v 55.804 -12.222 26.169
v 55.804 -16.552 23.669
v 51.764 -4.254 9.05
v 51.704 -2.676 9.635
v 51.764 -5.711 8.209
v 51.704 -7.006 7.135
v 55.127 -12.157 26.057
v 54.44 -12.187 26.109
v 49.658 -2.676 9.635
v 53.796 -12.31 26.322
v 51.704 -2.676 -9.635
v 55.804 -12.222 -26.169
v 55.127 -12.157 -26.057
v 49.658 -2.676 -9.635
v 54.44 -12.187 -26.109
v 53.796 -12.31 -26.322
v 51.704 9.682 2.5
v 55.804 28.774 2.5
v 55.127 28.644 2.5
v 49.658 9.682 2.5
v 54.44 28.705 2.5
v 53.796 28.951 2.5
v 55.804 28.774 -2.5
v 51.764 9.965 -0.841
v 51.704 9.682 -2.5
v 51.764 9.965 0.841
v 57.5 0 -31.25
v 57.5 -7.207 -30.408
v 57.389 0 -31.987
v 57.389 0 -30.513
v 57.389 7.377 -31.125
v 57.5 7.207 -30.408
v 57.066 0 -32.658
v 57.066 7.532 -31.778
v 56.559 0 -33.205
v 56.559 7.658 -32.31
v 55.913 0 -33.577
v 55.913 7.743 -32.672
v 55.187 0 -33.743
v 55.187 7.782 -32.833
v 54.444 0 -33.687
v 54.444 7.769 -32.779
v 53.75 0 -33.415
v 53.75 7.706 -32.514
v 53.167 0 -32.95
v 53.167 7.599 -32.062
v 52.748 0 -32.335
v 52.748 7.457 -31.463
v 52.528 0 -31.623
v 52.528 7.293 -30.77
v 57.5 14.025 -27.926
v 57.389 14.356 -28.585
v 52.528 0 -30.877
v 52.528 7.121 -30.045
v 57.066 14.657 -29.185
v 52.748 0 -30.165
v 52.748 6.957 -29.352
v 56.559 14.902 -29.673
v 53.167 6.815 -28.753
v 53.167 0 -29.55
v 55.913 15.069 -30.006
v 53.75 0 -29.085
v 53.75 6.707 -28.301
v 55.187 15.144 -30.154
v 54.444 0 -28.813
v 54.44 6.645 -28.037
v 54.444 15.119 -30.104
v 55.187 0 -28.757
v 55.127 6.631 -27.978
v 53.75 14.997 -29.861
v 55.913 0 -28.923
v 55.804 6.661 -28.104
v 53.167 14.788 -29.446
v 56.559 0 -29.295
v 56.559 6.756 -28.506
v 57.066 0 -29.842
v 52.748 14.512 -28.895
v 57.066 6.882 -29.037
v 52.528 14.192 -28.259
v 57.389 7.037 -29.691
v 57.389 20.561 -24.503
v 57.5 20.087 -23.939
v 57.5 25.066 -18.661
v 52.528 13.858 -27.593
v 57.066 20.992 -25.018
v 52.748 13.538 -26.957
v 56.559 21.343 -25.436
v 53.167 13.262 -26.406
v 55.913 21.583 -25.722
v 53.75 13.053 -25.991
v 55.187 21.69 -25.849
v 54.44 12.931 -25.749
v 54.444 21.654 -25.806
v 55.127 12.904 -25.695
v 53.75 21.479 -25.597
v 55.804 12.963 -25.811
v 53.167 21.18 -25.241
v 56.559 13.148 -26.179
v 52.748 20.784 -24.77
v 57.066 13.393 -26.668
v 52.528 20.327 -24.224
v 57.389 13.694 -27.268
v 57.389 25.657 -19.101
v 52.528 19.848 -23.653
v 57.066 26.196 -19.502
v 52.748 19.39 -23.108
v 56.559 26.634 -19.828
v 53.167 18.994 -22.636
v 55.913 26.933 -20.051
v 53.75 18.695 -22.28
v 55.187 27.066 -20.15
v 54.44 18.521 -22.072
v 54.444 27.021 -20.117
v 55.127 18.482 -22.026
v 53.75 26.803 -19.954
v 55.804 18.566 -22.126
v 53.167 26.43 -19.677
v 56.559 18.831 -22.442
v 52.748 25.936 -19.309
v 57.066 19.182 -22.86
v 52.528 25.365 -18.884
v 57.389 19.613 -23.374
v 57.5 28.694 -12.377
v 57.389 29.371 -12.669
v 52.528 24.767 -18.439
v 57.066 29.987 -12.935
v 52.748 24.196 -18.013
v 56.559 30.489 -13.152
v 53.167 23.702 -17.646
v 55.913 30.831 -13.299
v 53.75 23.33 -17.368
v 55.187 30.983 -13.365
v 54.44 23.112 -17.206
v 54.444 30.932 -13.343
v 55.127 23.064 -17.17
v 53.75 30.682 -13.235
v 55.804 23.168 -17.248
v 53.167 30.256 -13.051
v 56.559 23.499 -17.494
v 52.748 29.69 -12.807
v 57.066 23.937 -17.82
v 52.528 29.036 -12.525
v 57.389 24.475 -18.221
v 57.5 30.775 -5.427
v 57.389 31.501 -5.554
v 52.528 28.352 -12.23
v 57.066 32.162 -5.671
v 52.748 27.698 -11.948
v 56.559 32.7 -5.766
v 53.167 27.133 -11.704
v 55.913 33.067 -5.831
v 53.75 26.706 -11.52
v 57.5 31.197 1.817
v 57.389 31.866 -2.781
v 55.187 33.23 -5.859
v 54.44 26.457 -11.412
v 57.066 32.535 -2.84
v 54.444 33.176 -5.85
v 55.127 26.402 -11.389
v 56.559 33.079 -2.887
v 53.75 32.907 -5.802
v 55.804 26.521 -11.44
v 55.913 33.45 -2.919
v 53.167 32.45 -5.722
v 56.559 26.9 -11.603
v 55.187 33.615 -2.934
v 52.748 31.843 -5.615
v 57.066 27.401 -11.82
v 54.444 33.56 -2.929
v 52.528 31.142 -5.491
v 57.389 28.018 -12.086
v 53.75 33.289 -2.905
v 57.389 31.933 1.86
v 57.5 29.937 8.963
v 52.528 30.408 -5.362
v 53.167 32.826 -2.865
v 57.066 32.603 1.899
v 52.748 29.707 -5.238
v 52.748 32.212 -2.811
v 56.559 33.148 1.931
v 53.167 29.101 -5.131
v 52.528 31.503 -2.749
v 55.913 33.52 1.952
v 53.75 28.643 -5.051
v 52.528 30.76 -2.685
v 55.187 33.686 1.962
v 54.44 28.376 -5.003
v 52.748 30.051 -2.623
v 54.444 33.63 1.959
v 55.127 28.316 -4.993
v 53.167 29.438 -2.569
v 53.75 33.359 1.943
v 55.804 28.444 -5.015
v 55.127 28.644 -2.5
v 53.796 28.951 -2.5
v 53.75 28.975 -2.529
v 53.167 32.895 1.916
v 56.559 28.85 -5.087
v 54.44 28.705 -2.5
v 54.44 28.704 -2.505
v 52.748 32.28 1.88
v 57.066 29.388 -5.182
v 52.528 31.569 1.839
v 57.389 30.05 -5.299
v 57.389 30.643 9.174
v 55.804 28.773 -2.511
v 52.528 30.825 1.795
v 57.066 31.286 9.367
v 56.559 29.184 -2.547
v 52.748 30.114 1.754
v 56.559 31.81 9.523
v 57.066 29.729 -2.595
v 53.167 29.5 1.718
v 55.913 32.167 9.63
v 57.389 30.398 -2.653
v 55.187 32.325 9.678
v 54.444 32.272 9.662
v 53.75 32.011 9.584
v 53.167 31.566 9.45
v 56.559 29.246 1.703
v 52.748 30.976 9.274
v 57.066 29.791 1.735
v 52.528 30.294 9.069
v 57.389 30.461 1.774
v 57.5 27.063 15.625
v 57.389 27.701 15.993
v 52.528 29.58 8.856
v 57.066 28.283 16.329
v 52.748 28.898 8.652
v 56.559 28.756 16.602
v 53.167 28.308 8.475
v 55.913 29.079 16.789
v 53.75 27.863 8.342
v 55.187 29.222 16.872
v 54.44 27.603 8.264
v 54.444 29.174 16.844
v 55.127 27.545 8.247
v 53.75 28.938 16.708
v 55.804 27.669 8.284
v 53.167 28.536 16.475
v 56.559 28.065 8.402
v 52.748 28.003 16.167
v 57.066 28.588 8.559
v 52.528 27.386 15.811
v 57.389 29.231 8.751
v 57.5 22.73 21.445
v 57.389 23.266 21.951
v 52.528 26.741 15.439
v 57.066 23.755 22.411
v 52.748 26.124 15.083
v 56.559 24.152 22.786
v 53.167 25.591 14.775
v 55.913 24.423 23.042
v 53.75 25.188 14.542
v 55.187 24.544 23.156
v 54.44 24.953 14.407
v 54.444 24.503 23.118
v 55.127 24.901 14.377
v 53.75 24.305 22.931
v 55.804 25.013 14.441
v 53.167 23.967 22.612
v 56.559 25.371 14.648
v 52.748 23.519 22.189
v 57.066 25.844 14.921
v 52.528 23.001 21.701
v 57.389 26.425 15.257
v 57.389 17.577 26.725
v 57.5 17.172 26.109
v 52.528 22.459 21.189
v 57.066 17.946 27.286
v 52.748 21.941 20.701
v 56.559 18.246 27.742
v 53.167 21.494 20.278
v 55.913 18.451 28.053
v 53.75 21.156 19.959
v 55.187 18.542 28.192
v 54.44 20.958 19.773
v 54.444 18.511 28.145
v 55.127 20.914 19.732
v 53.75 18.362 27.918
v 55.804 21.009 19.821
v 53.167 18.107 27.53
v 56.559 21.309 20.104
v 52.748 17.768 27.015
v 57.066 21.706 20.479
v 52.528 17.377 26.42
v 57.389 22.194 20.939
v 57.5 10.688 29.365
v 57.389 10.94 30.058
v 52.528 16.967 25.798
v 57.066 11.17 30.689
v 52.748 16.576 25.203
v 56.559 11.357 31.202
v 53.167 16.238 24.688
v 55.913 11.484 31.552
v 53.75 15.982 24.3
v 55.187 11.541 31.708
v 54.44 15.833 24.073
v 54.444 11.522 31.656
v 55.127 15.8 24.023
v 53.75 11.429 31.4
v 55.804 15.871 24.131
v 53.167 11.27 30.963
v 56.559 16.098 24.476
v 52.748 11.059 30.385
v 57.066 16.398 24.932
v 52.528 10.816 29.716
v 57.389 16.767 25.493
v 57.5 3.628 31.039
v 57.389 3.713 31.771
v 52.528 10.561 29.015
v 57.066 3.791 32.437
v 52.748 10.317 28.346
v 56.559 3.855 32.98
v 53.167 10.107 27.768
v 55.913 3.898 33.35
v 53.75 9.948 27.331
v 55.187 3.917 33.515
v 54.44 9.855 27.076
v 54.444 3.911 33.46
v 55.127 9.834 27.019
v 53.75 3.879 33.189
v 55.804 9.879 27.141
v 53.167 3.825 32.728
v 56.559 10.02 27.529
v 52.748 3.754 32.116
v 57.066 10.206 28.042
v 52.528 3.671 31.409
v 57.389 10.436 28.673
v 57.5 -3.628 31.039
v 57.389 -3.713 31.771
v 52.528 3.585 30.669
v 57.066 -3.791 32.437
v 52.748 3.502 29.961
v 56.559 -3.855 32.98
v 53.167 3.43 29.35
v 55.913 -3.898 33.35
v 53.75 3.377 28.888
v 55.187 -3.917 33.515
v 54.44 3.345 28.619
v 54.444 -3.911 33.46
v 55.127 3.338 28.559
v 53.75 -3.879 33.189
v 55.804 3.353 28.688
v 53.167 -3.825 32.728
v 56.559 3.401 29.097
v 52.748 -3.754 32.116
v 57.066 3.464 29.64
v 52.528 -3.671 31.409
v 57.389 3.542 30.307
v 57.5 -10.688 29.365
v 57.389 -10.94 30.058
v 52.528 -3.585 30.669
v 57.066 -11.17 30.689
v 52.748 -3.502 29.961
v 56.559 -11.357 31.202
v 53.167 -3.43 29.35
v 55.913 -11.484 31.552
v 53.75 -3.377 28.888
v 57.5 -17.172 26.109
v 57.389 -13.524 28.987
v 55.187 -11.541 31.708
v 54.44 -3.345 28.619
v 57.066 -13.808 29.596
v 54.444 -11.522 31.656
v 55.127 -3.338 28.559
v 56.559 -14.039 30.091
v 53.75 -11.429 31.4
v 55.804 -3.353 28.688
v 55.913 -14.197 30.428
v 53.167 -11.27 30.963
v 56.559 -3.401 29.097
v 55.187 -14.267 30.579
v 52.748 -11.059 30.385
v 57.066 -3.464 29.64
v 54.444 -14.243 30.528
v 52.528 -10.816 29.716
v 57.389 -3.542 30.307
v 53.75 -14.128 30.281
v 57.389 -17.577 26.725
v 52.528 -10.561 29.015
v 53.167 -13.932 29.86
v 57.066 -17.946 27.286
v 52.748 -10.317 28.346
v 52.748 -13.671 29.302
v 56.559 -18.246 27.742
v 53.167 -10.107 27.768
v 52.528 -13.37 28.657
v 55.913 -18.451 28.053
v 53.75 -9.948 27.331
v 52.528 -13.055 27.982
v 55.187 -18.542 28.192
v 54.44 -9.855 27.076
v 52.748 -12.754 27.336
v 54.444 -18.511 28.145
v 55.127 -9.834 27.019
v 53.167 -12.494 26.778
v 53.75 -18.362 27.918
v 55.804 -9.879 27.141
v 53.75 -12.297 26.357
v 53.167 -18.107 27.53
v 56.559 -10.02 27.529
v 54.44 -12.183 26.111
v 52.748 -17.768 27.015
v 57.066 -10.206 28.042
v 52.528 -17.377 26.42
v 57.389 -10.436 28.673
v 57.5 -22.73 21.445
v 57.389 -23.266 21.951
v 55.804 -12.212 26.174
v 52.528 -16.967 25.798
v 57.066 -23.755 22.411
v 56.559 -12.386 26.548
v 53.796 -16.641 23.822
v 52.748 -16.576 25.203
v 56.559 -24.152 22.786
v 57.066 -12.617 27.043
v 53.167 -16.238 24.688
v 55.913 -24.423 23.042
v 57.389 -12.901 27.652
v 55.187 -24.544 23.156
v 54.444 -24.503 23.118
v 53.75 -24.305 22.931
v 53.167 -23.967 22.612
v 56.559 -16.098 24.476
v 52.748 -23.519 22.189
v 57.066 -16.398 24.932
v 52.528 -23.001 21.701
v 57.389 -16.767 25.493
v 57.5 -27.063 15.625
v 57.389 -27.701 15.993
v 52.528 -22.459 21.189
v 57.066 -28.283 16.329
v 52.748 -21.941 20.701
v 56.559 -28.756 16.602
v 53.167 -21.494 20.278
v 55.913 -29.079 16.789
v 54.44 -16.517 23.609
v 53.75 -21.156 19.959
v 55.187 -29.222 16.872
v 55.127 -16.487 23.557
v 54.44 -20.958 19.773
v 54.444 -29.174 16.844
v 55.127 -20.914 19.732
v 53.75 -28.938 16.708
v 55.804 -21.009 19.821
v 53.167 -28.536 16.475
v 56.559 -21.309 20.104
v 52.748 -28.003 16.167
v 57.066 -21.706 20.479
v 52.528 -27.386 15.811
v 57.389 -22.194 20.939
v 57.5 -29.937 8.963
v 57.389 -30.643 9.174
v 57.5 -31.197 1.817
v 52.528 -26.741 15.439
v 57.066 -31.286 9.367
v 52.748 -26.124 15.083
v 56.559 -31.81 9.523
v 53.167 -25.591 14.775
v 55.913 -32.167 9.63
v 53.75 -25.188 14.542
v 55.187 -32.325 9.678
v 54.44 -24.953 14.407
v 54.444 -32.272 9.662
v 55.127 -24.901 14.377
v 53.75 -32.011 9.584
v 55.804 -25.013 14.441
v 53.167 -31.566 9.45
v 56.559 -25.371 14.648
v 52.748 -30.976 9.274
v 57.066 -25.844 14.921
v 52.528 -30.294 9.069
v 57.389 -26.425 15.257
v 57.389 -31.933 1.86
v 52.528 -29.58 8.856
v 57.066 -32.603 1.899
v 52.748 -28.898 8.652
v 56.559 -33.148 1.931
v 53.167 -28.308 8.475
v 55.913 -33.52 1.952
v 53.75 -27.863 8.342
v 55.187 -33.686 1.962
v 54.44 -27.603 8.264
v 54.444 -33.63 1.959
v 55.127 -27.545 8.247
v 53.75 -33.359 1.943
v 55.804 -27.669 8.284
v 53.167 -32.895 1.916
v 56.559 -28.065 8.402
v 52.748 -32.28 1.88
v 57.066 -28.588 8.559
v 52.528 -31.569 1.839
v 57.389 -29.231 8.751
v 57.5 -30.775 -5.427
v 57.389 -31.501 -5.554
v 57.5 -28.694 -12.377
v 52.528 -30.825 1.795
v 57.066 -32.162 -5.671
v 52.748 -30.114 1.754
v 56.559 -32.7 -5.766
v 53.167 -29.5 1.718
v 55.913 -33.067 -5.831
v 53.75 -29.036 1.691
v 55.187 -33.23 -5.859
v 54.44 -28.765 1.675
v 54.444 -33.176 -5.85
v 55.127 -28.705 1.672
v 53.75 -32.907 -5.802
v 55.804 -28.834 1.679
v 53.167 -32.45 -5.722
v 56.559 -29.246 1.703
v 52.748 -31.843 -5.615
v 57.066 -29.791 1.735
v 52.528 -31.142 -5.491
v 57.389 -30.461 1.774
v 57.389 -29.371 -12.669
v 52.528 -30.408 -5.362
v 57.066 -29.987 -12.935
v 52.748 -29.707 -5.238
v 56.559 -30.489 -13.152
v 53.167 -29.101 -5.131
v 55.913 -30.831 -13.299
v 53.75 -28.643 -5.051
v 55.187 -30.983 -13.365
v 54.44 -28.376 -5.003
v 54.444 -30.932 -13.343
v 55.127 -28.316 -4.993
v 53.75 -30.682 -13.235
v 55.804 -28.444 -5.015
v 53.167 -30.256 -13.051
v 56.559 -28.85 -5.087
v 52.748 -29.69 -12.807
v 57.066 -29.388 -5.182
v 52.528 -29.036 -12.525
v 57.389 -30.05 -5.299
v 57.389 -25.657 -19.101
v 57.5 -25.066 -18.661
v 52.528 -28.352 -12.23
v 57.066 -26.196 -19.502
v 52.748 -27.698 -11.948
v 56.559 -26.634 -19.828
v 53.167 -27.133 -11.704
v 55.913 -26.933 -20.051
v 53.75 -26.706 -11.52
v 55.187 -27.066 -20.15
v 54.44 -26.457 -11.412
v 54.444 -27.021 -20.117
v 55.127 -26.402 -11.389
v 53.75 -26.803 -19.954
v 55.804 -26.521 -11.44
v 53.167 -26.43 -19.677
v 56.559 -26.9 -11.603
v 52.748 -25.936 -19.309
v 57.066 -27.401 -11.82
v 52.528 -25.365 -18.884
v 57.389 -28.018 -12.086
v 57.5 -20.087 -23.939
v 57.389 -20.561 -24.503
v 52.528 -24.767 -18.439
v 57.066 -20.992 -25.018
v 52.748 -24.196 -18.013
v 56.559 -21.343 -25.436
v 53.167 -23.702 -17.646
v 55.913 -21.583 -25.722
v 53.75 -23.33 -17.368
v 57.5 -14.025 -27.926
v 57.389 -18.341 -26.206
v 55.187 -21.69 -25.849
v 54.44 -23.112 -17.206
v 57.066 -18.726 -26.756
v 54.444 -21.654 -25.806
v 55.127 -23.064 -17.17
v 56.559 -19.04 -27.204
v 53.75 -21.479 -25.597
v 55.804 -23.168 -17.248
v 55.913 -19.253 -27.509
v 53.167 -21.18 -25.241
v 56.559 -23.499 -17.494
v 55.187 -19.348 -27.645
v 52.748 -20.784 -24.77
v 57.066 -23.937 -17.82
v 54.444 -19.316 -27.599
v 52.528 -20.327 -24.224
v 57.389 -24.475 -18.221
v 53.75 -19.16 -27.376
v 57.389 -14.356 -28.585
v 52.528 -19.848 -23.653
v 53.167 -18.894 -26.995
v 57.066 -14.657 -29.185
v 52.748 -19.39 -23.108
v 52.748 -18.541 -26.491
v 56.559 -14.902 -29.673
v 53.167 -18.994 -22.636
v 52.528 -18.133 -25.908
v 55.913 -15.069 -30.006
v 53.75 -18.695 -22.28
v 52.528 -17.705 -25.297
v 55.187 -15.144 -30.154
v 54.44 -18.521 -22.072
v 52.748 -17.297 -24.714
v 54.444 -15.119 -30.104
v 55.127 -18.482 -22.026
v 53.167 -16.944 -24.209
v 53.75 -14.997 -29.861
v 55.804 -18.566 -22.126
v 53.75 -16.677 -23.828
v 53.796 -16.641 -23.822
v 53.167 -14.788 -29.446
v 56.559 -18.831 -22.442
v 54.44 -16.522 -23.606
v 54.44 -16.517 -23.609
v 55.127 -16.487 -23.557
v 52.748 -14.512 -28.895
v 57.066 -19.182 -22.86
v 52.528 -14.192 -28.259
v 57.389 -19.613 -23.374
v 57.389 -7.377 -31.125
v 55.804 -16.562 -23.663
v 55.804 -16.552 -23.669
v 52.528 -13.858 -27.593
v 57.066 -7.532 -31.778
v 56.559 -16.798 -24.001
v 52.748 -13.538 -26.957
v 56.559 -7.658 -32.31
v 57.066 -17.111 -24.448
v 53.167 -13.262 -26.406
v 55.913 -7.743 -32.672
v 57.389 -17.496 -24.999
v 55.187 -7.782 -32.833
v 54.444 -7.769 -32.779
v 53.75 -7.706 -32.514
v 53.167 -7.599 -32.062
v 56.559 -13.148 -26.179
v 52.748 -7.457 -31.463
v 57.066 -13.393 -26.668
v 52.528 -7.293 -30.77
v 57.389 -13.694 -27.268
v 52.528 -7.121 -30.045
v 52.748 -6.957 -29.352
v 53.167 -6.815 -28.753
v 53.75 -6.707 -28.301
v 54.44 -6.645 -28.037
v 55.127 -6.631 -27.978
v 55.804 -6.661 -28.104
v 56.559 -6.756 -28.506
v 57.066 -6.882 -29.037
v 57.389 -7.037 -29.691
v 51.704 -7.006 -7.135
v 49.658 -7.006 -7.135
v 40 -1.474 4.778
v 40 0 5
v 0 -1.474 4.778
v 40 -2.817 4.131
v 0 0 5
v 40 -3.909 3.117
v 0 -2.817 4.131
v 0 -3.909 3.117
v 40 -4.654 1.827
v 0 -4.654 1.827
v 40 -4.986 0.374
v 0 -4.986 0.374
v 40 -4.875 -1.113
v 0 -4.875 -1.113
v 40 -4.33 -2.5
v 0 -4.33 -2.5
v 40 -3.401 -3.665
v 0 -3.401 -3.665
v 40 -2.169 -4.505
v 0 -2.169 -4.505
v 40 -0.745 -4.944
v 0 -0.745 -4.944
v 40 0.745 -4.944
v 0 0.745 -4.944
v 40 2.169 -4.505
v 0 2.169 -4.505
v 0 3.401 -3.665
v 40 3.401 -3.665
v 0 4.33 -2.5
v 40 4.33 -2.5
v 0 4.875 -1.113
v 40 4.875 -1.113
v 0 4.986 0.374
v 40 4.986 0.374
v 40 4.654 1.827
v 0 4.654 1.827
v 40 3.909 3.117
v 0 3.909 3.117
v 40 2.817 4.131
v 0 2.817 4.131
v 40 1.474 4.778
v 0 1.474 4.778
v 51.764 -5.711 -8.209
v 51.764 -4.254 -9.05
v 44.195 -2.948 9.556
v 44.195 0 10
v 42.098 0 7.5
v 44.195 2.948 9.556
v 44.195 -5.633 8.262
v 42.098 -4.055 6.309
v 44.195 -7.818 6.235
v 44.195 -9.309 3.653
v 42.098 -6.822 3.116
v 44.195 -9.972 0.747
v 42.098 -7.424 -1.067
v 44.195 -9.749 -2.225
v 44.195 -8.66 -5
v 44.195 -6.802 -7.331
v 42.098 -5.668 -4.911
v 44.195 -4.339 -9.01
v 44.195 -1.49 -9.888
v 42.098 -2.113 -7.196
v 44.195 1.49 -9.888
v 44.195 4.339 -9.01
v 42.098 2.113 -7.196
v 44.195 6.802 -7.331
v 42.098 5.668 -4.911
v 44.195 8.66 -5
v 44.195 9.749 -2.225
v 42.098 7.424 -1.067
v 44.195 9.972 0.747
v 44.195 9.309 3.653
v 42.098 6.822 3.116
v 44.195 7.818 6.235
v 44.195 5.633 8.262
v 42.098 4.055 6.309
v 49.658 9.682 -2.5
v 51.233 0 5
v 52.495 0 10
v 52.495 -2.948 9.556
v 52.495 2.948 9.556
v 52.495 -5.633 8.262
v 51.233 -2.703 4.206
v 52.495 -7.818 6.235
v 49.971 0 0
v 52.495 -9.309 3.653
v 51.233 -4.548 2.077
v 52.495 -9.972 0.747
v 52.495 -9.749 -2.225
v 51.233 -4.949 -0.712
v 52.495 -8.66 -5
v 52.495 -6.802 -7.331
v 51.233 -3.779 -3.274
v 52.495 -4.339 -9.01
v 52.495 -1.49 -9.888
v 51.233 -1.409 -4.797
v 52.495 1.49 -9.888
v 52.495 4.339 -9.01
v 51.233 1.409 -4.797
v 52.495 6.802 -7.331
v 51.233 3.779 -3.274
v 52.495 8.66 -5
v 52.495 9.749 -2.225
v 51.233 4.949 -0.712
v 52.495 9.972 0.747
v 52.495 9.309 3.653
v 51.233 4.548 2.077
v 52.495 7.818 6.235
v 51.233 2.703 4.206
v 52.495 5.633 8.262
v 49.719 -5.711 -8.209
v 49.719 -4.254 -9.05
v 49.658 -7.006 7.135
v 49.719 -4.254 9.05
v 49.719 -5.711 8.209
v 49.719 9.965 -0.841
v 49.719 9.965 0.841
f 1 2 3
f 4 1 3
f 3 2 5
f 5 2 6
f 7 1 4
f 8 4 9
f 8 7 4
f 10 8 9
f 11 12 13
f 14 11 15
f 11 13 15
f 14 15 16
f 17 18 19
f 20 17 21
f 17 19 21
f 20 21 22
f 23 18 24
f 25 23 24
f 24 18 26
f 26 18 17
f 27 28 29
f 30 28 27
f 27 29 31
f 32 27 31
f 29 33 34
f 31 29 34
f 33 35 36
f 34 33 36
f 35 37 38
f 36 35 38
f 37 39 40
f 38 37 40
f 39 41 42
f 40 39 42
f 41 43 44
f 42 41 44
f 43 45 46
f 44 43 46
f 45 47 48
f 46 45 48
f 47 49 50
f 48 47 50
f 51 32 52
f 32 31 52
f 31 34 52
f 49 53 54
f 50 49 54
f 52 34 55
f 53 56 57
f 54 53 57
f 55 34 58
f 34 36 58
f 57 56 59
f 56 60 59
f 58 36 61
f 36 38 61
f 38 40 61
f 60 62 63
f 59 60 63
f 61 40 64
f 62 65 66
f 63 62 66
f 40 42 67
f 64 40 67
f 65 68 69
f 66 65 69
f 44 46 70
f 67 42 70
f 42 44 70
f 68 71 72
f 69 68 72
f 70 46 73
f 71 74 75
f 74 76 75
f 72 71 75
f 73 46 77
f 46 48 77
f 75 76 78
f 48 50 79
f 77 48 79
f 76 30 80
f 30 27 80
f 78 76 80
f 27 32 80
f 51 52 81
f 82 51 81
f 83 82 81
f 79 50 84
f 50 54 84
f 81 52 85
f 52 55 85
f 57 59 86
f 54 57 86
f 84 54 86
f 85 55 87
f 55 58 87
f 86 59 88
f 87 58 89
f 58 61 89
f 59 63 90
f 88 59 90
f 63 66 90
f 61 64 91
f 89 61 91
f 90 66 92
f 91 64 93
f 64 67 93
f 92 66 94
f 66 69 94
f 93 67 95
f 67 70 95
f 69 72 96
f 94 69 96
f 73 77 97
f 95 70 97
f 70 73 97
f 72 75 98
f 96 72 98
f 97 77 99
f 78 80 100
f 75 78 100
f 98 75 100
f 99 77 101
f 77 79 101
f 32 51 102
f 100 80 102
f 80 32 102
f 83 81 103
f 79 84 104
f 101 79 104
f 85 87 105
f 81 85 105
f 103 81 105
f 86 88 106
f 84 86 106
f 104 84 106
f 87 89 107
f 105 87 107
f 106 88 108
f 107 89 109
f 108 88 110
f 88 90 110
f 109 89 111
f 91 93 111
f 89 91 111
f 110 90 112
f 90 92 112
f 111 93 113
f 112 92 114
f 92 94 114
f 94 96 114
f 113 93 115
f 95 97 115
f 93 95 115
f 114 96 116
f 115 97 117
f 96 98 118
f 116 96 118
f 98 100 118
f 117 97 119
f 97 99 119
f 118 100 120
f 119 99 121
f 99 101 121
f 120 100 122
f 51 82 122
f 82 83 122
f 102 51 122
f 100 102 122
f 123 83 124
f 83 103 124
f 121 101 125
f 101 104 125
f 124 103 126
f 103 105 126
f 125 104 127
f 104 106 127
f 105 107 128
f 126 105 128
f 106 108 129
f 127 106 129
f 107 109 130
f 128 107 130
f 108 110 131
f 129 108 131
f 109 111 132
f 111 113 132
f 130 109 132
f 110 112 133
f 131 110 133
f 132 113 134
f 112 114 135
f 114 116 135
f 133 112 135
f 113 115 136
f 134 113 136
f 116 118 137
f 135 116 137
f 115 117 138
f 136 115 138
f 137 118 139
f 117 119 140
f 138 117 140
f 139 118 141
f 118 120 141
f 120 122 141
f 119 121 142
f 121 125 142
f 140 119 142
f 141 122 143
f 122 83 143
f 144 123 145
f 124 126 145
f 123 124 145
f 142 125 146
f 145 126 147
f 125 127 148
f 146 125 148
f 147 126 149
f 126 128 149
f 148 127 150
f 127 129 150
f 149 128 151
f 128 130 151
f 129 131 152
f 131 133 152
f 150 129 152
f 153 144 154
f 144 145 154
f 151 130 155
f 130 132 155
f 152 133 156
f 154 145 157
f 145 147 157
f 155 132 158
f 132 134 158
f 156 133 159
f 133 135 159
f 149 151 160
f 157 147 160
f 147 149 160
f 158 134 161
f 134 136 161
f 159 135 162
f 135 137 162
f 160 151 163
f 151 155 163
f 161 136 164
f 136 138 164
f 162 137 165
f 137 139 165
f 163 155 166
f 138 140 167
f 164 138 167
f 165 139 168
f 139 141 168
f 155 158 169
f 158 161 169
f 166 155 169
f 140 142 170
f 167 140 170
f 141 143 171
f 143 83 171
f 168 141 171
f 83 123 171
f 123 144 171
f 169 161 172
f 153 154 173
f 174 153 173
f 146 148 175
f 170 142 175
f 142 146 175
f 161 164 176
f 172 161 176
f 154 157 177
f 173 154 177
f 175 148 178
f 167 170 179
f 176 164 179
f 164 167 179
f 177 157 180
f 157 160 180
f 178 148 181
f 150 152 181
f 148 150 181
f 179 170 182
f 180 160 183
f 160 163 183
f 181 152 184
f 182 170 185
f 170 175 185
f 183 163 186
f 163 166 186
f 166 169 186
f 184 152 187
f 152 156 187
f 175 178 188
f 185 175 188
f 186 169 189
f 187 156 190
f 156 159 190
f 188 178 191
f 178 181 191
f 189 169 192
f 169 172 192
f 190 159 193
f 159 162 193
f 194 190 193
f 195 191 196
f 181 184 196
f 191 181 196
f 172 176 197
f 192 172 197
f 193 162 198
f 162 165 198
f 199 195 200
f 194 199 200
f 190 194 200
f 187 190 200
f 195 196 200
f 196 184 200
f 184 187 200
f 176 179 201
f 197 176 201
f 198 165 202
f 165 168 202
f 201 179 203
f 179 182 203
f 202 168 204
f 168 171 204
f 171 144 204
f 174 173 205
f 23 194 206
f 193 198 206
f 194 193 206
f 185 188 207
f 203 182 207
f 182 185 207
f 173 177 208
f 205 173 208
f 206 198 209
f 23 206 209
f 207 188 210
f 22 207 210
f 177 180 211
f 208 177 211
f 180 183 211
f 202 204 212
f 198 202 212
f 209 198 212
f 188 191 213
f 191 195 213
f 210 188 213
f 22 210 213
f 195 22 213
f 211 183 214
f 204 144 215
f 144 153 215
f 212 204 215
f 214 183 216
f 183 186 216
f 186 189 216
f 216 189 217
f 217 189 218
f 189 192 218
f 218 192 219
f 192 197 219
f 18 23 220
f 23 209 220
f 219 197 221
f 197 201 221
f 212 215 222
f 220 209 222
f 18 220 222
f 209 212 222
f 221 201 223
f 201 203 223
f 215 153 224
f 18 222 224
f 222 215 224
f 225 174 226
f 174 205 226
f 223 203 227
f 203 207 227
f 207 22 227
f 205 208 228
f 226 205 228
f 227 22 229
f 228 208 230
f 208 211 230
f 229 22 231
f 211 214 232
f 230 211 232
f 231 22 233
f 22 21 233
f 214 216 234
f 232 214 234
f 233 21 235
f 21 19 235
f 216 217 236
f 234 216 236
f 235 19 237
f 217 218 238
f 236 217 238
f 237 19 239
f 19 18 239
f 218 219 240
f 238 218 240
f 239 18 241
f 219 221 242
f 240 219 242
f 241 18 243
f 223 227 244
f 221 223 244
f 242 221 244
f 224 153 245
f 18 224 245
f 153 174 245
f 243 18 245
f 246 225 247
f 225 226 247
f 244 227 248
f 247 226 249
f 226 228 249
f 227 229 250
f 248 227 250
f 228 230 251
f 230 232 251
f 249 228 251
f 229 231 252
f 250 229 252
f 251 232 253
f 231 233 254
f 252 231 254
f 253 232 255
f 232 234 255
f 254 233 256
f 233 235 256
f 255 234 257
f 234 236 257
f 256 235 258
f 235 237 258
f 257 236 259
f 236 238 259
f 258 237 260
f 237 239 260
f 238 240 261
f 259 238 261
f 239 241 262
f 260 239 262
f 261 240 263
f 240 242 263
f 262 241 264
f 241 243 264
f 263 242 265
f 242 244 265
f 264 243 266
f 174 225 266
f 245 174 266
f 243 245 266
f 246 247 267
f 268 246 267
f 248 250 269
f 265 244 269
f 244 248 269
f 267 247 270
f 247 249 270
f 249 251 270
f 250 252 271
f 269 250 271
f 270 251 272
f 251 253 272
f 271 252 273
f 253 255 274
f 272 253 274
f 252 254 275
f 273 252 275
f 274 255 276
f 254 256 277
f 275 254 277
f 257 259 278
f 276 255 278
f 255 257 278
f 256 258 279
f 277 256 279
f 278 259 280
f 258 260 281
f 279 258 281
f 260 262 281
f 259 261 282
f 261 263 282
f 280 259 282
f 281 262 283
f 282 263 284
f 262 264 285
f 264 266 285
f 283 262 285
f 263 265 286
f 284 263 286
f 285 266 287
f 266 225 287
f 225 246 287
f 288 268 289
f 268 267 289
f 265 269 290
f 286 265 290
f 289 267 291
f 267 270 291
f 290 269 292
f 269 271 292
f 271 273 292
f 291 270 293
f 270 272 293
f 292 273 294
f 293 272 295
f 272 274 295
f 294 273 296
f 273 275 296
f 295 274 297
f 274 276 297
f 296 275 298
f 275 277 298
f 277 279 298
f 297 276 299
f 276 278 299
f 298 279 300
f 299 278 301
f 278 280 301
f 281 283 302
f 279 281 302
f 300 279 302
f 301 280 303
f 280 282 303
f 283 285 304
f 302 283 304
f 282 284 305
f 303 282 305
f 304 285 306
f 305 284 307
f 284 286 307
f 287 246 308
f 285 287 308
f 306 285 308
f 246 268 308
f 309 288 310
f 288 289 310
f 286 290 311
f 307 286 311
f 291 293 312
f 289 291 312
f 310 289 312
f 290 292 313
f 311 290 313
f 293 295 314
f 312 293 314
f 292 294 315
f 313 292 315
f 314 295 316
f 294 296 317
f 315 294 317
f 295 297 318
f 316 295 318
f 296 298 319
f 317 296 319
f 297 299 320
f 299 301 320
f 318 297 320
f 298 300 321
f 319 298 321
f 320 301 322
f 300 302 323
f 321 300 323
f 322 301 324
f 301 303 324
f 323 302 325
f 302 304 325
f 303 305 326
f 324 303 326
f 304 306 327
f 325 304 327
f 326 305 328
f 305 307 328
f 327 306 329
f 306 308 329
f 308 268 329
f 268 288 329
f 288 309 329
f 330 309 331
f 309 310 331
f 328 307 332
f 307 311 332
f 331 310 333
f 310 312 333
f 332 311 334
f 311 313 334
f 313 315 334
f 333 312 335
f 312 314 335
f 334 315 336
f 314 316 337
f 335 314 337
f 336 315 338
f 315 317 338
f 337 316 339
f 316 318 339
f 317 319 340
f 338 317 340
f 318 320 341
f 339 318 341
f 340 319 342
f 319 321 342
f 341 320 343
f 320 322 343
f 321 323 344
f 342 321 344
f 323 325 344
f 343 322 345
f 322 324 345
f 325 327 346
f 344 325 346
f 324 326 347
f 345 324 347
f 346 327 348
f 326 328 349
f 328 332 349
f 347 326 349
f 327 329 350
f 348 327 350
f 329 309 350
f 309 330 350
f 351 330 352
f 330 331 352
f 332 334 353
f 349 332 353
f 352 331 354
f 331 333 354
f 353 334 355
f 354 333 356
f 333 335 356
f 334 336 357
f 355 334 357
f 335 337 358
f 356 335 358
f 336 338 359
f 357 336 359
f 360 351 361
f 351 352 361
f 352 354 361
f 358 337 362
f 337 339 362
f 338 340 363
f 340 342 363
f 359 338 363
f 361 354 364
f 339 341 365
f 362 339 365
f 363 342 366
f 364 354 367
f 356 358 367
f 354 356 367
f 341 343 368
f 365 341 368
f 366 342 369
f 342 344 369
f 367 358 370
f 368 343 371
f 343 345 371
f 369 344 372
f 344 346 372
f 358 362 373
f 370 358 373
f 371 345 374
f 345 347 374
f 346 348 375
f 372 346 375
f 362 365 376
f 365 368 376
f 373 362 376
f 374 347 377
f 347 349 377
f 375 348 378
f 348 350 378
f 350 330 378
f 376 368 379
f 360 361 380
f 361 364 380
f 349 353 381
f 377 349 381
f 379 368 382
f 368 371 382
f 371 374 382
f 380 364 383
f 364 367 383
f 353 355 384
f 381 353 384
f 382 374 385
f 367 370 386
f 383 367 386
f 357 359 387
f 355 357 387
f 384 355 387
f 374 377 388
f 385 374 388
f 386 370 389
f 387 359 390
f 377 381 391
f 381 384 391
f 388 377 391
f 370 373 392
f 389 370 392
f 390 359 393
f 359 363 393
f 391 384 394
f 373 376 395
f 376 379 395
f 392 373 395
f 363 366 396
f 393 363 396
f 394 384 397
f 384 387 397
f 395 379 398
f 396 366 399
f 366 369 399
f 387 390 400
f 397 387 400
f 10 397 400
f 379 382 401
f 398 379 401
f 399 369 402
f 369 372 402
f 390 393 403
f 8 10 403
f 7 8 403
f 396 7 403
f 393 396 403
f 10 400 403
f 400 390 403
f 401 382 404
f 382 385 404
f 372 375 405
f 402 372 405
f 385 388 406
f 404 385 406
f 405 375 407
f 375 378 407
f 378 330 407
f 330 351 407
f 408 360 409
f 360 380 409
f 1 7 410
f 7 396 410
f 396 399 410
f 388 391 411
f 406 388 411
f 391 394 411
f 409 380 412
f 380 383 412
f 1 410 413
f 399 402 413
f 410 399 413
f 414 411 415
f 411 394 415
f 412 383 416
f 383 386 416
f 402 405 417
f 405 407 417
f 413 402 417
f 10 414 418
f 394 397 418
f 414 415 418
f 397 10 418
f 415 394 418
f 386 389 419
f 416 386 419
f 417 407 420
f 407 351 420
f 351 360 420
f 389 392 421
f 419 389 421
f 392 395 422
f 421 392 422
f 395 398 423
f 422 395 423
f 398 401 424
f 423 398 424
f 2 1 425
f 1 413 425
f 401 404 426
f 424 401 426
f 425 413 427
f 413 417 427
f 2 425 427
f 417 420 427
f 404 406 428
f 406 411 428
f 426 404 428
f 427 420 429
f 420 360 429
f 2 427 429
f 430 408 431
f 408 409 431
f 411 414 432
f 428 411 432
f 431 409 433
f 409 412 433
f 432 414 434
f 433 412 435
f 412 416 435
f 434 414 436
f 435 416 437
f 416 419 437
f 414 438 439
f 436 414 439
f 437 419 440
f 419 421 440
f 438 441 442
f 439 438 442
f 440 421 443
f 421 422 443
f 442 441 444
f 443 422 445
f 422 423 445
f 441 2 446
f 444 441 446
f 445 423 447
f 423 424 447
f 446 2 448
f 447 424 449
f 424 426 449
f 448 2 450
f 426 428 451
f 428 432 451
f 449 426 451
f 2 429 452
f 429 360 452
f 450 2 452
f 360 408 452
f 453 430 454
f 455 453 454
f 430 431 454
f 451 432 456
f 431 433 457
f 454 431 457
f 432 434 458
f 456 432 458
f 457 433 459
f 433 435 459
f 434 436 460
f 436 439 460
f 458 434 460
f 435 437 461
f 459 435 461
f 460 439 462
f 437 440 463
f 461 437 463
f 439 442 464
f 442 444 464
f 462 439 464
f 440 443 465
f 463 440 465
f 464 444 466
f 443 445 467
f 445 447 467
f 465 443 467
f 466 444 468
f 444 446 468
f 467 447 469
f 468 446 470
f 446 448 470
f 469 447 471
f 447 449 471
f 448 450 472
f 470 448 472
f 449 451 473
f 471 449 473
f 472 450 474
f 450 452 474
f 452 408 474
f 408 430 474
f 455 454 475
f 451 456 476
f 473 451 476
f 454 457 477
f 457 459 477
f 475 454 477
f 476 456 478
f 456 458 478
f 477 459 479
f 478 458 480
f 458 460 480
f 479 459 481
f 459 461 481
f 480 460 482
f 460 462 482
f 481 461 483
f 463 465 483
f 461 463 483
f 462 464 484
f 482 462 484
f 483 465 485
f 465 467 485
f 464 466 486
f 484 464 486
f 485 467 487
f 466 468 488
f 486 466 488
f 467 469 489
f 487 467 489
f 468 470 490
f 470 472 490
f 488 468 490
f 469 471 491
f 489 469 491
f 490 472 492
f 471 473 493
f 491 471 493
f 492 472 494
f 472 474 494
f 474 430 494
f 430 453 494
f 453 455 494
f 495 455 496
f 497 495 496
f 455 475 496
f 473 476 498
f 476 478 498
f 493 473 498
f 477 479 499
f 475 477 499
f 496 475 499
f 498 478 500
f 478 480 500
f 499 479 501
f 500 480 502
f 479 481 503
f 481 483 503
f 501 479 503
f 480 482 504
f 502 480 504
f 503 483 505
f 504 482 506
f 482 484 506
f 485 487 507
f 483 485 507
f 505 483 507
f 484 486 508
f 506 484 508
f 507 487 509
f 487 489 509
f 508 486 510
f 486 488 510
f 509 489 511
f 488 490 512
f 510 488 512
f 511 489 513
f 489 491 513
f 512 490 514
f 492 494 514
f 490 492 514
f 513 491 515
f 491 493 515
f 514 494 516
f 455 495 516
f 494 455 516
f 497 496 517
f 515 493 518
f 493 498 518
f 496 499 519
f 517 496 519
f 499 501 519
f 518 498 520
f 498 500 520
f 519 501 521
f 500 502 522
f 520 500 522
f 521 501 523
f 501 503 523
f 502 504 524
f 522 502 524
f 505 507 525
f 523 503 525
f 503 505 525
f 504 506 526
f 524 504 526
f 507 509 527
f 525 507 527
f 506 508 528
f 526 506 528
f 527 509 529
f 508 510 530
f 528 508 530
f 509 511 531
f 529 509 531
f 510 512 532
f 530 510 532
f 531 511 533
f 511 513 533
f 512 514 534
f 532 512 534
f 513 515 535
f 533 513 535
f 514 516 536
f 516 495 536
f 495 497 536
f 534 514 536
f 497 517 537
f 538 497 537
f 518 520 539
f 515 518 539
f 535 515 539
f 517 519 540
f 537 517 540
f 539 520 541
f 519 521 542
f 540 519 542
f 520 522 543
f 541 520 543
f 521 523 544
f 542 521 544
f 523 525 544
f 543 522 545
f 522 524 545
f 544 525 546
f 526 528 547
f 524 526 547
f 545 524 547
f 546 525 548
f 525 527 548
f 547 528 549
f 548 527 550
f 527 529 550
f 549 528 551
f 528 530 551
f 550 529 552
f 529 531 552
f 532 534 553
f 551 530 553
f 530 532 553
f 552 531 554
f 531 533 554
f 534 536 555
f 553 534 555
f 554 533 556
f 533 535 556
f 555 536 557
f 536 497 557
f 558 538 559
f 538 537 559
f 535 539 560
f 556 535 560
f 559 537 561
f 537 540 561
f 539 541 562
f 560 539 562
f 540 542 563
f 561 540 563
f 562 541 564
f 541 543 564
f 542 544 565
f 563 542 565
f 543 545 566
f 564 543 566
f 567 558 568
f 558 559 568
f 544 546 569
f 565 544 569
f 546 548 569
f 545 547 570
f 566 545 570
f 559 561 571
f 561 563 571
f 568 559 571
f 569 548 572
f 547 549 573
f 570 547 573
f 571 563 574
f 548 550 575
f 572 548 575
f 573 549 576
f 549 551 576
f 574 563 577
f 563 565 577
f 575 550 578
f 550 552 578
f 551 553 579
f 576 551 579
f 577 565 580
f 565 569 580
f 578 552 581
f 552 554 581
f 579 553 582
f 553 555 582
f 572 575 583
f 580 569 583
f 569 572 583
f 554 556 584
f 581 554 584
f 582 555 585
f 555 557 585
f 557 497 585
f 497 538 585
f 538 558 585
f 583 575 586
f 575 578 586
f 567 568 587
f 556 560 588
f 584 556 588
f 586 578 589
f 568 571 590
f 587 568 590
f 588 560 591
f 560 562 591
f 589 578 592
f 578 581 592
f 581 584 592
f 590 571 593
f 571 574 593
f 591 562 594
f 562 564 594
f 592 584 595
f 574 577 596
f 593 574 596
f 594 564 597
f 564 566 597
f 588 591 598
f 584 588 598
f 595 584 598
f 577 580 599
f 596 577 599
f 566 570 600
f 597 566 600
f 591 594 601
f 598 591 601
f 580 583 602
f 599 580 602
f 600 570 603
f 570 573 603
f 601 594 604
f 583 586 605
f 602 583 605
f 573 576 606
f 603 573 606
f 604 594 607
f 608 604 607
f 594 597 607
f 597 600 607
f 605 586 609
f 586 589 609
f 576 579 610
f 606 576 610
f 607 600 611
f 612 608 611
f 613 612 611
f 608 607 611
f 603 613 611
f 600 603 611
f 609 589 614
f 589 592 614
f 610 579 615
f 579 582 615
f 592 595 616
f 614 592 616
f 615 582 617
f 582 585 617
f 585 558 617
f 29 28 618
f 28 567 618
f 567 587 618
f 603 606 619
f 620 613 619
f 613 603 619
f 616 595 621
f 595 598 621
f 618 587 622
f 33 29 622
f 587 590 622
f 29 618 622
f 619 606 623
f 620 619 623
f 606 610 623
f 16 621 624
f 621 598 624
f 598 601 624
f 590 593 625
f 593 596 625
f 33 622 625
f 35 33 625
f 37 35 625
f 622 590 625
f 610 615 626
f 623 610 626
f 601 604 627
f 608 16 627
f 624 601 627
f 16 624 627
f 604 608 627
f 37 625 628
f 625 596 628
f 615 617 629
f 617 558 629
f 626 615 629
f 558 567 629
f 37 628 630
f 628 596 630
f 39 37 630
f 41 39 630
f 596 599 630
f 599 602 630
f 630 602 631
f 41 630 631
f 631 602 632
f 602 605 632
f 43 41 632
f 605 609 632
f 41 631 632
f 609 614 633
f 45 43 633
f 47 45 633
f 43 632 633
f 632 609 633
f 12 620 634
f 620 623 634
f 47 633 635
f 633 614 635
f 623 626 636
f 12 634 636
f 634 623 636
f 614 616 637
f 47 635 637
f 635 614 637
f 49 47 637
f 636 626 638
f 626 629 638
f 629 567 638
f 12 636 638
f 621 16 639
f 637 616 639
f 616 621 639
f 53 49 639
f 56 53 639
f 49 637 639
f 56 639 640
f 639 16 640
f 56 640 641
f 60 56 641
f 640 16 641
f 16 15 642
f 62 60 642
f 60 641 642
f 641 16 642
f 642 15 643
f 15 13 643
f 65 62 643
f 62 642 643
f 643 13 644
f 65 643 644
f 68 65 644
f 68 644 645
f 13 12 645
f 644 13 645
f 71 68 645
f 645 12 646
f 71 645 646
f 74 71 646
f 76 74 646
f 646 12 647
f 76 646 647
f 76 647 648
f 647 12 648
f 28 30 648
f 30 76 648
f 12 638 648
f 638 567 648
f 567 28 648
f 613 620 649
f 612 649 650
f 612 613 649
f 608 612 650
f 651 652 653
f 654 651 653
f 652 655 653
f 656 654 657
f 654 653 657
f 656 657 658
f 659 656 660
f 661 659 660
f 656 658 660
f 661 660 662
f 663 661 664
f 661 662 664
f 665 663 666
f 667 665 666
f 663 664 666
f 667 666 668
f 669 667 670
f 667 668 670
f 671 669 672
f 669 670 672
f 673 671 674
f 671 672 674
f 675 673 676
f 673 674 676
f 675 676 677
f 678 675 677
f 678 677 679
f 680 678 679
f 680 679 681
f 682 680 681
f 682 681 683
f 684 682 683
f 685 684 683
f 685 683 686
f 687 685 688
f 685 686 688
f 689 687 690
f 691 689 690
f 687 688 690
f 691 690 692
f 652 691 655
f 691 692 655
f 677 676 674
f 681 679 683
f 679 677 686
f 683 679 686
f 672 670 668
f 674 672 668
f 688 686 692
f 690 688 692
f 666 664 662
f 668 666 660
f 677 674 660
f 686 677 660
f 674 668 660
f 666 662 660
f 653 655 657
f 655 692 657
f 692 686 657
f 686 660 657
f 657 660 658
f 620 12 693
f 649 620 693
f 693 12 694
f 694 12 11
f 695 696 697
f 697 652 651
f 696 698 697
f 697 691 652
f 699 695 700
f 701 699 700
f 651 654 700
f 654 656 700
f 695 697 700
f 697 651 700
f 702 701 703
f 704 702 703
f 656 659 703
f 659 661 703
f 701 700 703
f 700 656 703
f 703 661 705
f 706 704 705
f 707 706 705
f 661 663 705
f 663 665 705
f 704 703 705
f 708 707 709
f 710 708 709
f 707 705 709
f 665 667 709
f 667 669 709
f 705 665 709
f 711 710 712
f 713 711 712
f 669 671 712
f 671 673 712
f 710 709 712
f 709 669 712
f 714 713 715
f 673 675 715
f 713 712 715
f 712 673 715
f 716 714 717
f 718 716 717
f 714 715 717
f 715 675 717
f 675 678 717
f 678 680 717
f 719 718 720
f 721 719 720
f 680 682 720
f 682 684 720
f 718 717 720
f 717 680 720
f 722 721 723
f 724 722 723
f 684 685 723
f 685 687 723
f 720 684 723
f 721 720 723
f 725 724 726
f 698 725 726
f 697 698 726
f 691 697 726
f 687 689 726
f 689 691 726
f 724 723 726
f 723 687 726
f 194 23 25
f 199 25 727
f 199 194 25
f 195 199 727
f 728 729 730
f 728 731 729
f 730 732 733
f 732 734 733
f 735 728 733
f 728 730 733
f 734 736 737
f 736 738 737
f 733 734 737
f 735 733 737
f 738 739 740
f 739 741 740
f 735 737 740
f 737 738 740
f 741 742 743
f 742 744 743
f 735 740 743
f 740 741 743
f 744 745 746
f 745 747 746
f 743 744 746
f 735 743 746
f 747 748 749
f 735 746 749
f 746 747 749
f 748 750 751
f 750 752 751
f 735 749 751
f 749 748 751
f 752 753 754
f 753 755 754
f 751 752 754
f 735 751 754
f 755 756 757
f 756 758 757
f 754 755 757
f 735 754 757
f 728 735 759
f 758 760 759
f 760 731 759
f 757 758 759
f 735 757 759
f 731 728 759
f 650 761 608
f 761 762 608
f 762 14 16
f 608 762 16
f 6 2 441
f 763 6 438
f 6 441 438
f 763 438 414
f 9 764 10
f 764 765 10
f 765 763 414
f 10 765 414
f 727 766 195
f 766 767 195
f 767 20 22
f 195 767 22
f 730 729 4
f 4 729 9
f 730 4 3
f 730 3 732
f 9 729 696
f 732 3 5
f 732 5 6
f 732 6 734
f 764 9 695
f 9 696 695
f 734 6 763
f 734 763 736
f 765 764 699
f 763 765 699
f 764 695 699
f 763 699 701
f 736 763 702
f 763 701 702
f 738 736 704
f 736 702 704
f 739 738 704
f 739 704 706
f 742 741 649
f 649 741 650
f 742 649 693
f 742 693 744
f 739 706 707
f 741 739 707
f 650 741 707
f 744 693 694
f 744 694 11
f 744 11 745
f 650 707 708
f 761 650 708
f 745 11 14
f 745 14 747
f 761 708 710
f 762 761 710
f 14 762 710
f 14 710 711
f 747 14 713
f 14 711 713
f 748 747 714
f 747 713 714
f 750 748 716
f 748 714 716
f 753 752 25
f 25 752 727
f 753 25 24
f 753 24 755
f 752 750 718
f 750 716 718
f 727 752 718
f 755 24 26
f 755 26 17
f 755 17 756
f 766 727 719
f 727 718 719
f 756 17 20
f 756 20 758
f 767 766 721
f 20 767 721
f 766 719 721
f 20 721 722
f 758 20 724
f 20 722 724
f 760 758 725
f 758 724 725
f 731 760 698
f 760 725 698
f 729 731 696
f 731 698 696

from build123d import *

# Parameters (mm, degrees)
SKETCH2_R           = 2.5
BOSS_EXTRUDE1_DEPTH = 2.5
CIRPATTERN1_COUNT   = 3


with BuildPart() as part:
    # Sketch1 → Revolve1 (revolve)
    with BuildSketch(Plane.XY, mode=Mode.PRIVATE) as revolve1_sk:
        Polygon((49.97067965, 0), (52.495498156, 10), (44.195498156, 10), (40, 5), (0, 5), (0, 0), align=None)
    revolve(revolve1_sk.sketch.rotate(Axis((-81.869594145, 0, 0), (1, 0, 0)), 90), axis=Axis((-81.869594145, 0, 0), (1, 0, 0)))



with BuildPart() as body_2:
    # Sketch2 → Revolve2 (revolve)
    with BuildSketch(Plane.XY, mode=Mode.PRIVATE) as revolve2_sk:
        with Locations((55, 31.25)):
            Circle(SKETCH2_R)
    revolve(revolve2_sk.sketch.rotate(Axis((0, 0, 0), (1, 0, 0)), 270), axis=Axis((0, 0, 0), (1, 0, 0)))


with BuildPart() as part_1:
    add(part.part)

    add(body_2.part)  # Boss-Extrude1 merges body 2
    # Sketch3 → Boss-Extrude1 (add, symmetric)
    with BuildSketch(Plane.XY):
        Polygon((51.6, 9.2), (49.554391748, 9.2), (53.974391748, 29.779681075), (56.02, 29.779681075), align=None)
    boss_extrude1 = extrude(amount=BOSS_EXTRUDE1_DEPTH, both=True)

    # CirPattern1: Boss-Extrude1 ×3 about axis
    cirpattern1_axis = Axis((0, 0, 0), (1, 0, 0))
    for i in range(1, CIRPATTERN1_COUNT):
        add(boss_extrude1.rotate(cirpattern1_axis, i * 360 / CIRPATTERN1_COUNT))


solid = part_1.part
